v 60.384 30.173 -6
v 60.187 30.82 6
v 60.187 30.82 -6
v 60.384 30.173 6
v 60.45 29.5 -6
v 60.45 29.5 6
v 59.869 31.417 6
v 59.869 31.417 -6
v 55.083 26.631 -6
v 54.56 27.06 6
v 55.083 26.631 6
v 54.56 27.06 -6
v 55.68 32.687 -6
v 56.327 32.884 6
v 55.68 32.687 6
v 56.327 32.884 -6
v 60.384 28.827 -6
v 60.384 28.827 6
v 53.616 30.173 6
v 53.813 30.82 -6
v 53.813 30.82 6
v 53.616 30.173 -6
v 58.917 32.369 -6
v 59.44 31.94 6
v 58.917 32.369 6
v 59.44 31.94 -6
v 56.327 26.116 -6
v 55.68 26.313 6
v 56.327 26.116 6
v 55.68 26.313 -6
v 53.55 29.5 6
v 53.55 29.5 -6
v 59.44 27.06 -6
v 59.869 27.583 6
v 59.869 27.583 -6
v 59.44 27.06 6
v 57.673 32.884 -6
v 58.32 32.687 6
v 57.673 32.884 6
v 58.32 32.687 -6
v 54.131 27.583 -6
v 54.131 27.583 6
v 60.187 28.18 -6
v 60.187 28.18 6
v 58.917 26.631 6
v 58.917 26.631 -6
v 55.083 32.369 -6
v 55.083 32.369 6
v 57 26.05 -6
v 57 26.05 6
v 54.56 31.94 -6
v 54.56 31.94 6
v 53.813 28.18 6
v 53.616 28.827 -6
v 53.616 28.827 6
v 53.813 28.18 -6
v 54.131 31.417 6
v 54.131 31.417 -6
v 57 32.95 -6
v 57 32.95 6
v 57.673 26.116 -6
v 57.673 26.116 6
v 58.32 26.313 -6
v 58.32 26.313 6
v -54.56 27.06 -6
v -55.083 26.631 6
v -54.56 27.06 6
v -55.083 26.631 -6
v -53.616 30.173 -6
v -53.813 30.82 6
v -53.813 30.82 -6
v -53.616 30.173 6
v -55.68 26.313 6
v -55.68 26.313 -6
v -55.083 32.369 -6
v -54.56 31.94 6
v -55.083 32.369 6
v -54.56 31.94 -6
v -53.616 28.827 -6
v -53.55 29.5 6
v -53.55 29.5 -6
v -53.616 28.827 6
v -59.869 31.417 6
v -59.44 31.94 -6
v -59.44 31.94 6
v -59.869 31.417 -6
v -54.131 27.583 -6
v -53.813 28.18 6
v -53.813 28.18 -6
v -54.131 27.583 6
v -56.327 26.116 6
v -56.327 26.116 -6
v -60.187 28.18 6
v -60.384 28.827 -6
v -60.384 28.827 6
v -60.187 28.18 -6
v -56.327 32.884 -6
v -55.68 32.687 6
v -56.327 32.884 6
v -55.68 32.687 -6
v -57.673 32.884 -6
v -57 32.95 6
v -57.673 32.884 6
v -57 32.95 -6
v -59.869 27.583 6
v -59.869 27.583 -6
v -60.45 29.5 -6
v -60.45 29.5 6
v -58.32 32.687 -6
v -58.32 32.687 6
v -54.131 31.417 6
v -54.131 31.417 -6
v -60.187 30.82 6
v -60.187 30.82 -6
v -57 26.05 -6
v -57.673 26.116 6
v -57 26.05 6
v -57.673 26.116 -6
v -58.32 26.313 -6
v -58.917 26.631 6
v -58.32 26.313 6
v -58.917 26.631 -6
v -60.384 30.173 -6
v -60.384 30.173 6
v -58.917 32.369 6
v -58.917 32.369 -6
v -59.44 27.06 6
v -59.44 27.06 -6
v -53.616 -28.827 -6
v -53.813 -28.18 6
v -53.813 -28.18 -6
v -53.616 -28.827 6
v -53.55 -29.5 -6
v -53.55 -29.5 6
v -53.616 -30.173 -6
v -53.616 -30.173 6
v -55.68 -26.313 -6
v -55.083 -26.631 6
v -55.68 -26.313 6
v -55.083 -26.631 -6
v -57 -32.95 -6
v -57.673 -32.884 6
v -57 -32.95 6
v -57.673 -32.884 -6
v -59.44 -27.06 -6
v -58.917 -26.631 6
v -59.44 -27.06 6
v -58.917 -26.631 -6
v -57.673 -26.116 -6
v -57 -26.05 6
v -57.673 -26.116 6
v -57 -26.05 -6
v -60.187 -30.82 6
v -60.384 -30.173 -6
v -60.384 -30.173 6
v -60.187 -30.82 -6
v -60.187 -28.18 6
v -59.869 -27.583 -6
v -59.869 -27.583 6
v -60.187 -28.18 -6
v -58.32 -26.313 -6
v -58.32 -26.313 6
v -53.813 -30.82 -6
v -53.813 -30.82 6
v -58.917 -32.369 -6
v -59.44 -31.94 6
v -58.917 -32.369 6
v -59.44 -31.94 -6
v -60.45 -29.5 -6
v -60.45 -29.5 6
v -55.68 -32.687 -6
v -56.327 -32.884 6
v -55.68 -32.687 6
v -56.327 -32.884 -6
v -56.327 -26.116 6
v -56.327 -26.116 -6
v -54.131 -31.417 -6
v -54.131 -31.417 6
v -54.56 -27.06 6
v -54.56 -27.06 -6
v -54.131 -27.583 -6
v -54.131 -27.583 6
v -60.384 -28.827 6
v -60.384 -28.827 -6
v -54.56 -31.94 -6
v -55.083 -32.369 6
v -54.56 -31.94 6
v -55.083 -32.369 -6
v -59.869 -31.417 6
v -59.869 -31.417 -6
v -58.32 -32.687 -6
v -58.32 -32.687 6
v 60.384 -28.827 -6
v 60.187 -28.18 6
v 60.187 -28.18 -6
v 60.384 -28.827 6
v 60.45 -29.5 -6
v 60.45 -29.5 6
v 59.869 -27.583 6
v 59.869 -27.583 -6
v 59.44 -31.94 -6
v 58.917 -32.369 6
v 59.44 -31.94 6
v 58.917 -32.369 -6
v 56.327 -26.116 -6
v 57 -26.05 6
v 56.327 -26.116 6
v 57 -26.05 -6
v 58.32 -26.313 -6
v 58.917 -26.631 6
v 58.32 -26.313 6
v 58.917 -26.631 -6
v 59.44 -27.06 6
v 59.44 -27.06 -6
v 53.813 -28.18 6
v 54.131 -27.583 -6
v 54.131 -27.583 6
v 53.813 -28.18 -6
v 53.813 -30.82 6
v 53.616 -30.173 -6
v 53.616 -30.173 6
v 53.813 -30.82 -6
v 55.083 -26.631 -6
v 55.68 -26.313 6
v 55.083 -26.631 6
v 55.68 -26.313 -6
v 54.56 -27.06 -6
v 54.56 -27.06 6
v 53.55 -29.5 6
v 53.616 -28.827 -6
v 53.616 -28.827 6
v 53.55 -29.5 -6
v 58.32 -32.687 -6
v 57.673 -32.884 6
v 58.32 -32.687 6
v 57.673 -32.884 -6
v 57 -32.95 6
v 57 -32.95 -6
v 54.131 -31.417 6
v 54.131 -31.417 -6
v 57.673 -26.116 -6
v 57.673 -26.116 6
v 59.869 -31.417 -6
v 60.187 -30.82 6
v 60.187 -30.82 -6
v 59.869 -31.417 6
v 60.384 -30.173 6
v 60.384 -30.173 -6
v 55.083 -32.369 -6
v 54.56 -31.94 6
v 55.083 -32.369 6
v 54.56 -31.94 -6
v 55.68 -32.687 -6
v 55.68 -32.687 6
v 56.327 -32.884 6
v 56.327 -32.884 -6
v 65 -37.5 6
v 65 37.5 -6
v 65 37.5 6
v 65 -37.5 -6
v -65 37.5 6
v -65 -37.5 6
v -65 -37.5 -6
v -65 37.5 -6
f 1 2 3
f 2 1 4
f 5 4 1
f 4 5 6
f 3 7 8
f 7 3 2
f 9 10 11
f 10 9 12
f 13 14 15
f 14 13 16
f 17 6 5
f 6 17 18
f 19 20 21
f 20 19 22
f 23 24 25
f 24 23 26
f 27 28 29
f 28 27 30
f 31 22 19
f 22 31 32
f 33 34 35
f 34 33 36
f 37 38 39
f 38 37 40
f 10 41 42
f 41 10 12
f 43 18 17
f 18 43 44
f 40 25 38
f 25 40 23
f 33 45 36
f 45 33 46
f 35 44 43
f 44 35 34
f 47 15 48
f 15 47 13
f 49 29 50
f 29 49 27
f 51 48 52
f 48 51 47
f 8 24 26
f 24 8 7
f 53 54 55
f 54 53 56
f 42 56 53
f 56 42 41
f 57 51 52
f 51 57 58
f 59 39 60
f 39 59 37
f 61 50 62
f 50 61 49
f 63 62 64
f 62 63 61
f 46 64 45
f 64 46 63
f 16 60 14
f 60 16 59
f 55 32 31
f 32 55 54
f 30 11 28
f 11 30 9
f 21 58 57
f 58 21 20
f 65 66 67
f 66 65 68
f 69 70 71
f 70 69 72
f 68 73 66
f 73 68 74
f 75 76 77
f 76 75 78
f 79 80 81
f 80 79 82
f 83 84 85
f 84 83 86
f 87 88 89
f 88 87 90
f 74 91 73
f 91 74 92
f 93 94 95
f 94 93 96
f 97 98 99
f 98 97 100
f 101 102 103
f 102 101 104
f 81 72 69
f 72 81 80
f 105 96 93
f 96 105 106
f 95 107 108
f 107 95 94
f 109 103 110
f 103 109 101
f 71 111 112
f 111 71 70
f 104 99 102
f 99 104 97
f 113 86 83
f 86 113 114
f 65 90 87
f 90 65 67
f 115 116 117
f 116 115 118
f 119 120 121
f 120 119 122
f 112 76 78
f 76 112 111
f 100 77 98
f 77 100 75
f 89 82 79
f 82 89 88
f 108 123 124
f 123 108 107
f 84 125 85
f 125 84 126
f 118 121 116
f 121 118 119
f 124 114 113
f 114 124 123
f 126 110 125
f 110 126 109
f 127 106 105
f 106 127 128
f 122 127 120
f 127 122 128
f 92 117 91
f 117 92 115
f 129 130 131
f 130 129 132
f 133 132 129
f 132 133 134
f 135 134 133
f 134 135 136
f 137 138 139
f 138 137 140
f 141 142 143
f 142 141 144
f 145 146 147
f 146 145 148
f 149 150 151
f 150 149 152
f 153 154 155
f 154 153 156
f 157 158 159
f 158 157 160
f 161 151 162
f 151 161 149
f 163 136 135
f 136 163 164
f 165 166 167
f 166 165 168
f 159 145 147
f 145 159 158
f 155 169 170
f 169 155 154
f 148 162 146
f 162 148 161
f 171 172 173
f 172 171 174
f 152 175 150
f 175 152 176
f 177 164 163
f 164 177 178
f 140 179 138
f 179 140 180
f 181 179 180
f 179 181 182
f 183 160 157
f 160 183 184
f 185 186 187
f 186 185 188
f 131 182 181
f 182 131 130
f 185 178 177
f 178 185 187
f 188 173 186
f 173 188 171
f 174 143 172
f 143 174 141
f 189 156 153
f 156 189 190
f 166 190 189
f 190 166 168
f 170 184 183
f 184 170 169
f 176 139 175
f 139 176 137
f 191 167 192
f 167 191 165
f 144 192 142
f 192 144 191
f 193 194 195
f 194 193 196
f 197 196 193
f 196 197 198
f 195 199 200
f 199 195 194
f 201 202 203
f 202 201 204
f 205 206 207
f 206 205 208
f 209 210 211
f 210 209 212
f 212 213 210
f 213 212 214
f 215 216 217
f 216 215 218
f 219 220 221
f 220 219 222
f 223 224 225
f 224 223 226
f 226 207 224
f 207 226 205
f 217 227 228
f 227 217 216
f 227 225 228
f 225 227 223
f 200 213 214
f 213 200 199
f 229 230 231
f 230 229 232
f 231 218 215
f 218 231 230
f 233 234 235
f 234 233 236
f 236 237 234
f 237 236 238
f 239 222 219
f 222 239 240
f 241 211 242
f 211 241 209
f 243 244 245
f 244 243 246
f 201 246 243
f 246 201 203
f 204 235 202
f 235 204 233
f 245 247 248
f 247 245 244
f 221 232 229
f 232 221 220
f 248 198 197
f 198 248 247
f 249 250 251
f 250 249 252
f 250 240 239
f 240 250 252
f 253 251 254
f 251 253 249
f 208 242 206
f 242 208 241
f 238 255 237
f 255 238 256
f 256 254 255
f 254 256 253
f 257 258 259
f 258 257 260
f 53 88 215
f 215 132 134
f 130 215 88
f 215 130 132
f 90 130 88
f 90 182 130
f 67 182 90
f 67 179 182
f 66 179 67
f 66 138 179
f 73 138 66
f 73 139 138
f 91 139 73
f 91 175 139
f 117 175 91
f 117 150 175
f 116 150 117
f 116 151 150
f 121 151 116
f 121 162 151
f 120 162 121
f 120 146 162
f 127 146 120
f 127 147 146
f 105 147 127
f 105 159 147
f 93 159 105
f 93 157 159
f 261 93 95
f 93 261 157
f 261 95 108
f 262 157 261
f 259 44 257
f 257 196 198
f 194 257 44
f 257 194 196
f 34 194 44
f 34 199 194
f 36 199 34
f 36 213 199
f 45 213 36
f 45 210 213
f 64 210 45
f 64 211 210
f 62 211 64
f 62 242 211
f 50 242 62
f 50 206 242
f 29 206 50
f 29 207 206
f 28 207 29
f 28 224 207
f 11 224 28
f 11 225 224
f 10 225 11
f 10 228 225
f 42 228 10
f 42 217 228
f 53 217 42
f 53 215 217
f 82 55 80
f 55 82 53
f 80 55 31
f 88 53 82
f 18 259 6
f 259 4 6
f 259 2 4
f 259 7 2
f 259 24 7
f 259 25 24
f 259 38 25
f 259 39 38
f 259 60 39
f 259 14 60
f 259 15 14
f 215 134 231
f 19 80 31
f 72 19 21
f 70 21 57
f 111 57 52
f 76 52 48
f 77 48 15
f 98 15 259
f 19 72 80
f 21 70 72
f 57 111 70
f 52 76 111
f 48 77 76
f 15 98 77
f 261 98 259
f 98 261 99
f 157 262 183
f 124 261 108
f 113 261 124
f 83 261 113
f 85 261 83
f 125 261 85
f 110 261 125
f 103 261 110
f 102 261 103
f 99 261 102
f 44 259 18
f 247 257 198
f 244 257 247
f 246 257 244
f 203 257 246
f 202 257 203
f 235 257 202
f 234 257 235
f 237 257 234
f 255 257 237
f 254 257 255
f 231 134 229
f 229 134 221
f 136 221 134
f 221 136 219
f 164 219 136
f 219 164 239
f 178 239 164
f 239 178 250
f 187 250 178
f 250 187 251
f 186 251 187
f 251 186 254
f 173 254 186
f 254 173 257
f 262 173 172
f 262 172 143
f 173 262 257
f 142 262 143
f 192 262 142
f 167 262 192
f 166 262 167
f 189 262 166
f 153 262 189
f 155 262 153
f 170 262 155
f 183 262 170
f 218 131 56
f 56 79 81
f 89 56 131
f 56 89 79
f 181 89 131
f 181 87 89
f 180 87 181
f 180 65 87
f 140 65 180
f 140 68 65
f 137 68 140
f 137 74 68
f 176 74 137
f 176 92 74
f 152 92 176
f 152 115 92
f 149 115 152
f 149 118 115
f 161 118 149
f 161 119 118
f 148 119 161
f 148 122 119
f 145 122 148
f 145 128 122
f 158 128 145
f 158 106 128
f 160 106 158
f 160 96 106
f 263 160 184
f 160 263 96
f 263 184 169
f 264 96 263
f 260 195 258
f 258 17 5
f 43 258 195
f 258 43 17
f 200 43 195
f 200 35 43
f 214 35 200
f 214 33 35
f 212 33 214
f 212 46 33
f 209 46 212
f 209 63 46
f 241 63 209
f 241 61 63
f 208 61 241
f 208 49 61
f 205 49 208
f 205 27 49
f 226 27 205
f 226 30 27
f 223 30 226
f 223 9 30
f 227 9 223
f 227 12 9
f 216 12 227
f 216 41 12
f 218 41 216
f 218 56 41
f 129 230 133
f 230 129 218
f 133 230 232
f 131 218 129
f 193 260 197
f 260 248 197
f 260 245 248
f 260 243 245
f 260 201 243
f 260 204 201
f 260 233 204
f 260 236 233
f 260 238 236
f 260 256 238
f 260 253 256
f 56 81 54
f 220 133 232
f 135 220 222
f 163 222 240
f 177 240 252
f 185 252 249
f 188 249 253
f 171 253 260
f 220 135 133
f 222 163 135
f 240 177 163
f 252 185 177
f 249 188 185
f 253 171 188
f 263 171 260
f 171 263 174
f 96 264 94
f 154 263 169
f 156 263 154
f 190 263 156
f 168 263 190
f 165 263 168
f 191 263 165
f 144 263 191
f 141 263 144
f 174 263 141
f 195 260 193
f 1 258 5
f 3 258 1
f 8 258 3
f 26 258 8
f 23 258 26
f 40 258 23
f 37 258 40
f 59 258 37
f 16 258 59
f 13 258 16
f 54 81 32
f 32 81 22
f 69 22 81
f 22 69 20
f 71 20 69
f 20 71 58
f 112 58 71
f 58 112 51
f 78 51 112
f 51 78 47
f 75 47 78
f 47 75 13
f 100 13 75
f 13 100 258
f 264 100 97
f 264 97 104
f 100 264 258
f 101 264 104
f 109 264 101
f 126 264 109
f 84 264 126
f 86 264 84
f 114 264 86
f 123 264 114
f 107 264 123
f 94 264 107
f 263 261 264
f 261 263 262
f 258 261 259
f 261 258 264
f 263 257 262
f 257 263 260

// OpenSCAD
$fn = 32;

// ----------------------------------------------------------------------
// Corner plate 130 x 75 x 12
// 4 holes, centres taken from the edge offset
// ----------------------------------------------------------------------

// --- parameters (mm) ---
plate = [130, 75, 12];  // overall size (x, y, z)
holes = 4;              // number of holes the drawing asks for
bore_d = 6.6;           // nominal hole diameter from the drawing
print_allowance = 0.3;  // clearance added for printing
edge = 8;               // hole centre offset from the plate edge

// --- derived feature positions (mm) ---
hole_d = bore_d + print_allowance;  // = 6.9   hole diameter as printed
corner_x = plate[0] / 2 - edge;     // = 57   corner hole X
corner_y = plate[1] / 2 - edge;     // = 29.5   corner hole Y
feature_centers = [
  [corner_x, corner_y],
  [-corner_x, corner_y],
  [-corner_x, -corner_y],
  [corner_x, -corner_y]
];   // hole centres the loop below drills

// plate outline, every hole drilled through with the same cutters
difference() {
  cube(plate, center = true);
  for (centre = feature_centers)
    translate([centre[0], centre[1], 0])
      cylinder(d = hole_d, h = plate[2] + 2, center = true);
}
